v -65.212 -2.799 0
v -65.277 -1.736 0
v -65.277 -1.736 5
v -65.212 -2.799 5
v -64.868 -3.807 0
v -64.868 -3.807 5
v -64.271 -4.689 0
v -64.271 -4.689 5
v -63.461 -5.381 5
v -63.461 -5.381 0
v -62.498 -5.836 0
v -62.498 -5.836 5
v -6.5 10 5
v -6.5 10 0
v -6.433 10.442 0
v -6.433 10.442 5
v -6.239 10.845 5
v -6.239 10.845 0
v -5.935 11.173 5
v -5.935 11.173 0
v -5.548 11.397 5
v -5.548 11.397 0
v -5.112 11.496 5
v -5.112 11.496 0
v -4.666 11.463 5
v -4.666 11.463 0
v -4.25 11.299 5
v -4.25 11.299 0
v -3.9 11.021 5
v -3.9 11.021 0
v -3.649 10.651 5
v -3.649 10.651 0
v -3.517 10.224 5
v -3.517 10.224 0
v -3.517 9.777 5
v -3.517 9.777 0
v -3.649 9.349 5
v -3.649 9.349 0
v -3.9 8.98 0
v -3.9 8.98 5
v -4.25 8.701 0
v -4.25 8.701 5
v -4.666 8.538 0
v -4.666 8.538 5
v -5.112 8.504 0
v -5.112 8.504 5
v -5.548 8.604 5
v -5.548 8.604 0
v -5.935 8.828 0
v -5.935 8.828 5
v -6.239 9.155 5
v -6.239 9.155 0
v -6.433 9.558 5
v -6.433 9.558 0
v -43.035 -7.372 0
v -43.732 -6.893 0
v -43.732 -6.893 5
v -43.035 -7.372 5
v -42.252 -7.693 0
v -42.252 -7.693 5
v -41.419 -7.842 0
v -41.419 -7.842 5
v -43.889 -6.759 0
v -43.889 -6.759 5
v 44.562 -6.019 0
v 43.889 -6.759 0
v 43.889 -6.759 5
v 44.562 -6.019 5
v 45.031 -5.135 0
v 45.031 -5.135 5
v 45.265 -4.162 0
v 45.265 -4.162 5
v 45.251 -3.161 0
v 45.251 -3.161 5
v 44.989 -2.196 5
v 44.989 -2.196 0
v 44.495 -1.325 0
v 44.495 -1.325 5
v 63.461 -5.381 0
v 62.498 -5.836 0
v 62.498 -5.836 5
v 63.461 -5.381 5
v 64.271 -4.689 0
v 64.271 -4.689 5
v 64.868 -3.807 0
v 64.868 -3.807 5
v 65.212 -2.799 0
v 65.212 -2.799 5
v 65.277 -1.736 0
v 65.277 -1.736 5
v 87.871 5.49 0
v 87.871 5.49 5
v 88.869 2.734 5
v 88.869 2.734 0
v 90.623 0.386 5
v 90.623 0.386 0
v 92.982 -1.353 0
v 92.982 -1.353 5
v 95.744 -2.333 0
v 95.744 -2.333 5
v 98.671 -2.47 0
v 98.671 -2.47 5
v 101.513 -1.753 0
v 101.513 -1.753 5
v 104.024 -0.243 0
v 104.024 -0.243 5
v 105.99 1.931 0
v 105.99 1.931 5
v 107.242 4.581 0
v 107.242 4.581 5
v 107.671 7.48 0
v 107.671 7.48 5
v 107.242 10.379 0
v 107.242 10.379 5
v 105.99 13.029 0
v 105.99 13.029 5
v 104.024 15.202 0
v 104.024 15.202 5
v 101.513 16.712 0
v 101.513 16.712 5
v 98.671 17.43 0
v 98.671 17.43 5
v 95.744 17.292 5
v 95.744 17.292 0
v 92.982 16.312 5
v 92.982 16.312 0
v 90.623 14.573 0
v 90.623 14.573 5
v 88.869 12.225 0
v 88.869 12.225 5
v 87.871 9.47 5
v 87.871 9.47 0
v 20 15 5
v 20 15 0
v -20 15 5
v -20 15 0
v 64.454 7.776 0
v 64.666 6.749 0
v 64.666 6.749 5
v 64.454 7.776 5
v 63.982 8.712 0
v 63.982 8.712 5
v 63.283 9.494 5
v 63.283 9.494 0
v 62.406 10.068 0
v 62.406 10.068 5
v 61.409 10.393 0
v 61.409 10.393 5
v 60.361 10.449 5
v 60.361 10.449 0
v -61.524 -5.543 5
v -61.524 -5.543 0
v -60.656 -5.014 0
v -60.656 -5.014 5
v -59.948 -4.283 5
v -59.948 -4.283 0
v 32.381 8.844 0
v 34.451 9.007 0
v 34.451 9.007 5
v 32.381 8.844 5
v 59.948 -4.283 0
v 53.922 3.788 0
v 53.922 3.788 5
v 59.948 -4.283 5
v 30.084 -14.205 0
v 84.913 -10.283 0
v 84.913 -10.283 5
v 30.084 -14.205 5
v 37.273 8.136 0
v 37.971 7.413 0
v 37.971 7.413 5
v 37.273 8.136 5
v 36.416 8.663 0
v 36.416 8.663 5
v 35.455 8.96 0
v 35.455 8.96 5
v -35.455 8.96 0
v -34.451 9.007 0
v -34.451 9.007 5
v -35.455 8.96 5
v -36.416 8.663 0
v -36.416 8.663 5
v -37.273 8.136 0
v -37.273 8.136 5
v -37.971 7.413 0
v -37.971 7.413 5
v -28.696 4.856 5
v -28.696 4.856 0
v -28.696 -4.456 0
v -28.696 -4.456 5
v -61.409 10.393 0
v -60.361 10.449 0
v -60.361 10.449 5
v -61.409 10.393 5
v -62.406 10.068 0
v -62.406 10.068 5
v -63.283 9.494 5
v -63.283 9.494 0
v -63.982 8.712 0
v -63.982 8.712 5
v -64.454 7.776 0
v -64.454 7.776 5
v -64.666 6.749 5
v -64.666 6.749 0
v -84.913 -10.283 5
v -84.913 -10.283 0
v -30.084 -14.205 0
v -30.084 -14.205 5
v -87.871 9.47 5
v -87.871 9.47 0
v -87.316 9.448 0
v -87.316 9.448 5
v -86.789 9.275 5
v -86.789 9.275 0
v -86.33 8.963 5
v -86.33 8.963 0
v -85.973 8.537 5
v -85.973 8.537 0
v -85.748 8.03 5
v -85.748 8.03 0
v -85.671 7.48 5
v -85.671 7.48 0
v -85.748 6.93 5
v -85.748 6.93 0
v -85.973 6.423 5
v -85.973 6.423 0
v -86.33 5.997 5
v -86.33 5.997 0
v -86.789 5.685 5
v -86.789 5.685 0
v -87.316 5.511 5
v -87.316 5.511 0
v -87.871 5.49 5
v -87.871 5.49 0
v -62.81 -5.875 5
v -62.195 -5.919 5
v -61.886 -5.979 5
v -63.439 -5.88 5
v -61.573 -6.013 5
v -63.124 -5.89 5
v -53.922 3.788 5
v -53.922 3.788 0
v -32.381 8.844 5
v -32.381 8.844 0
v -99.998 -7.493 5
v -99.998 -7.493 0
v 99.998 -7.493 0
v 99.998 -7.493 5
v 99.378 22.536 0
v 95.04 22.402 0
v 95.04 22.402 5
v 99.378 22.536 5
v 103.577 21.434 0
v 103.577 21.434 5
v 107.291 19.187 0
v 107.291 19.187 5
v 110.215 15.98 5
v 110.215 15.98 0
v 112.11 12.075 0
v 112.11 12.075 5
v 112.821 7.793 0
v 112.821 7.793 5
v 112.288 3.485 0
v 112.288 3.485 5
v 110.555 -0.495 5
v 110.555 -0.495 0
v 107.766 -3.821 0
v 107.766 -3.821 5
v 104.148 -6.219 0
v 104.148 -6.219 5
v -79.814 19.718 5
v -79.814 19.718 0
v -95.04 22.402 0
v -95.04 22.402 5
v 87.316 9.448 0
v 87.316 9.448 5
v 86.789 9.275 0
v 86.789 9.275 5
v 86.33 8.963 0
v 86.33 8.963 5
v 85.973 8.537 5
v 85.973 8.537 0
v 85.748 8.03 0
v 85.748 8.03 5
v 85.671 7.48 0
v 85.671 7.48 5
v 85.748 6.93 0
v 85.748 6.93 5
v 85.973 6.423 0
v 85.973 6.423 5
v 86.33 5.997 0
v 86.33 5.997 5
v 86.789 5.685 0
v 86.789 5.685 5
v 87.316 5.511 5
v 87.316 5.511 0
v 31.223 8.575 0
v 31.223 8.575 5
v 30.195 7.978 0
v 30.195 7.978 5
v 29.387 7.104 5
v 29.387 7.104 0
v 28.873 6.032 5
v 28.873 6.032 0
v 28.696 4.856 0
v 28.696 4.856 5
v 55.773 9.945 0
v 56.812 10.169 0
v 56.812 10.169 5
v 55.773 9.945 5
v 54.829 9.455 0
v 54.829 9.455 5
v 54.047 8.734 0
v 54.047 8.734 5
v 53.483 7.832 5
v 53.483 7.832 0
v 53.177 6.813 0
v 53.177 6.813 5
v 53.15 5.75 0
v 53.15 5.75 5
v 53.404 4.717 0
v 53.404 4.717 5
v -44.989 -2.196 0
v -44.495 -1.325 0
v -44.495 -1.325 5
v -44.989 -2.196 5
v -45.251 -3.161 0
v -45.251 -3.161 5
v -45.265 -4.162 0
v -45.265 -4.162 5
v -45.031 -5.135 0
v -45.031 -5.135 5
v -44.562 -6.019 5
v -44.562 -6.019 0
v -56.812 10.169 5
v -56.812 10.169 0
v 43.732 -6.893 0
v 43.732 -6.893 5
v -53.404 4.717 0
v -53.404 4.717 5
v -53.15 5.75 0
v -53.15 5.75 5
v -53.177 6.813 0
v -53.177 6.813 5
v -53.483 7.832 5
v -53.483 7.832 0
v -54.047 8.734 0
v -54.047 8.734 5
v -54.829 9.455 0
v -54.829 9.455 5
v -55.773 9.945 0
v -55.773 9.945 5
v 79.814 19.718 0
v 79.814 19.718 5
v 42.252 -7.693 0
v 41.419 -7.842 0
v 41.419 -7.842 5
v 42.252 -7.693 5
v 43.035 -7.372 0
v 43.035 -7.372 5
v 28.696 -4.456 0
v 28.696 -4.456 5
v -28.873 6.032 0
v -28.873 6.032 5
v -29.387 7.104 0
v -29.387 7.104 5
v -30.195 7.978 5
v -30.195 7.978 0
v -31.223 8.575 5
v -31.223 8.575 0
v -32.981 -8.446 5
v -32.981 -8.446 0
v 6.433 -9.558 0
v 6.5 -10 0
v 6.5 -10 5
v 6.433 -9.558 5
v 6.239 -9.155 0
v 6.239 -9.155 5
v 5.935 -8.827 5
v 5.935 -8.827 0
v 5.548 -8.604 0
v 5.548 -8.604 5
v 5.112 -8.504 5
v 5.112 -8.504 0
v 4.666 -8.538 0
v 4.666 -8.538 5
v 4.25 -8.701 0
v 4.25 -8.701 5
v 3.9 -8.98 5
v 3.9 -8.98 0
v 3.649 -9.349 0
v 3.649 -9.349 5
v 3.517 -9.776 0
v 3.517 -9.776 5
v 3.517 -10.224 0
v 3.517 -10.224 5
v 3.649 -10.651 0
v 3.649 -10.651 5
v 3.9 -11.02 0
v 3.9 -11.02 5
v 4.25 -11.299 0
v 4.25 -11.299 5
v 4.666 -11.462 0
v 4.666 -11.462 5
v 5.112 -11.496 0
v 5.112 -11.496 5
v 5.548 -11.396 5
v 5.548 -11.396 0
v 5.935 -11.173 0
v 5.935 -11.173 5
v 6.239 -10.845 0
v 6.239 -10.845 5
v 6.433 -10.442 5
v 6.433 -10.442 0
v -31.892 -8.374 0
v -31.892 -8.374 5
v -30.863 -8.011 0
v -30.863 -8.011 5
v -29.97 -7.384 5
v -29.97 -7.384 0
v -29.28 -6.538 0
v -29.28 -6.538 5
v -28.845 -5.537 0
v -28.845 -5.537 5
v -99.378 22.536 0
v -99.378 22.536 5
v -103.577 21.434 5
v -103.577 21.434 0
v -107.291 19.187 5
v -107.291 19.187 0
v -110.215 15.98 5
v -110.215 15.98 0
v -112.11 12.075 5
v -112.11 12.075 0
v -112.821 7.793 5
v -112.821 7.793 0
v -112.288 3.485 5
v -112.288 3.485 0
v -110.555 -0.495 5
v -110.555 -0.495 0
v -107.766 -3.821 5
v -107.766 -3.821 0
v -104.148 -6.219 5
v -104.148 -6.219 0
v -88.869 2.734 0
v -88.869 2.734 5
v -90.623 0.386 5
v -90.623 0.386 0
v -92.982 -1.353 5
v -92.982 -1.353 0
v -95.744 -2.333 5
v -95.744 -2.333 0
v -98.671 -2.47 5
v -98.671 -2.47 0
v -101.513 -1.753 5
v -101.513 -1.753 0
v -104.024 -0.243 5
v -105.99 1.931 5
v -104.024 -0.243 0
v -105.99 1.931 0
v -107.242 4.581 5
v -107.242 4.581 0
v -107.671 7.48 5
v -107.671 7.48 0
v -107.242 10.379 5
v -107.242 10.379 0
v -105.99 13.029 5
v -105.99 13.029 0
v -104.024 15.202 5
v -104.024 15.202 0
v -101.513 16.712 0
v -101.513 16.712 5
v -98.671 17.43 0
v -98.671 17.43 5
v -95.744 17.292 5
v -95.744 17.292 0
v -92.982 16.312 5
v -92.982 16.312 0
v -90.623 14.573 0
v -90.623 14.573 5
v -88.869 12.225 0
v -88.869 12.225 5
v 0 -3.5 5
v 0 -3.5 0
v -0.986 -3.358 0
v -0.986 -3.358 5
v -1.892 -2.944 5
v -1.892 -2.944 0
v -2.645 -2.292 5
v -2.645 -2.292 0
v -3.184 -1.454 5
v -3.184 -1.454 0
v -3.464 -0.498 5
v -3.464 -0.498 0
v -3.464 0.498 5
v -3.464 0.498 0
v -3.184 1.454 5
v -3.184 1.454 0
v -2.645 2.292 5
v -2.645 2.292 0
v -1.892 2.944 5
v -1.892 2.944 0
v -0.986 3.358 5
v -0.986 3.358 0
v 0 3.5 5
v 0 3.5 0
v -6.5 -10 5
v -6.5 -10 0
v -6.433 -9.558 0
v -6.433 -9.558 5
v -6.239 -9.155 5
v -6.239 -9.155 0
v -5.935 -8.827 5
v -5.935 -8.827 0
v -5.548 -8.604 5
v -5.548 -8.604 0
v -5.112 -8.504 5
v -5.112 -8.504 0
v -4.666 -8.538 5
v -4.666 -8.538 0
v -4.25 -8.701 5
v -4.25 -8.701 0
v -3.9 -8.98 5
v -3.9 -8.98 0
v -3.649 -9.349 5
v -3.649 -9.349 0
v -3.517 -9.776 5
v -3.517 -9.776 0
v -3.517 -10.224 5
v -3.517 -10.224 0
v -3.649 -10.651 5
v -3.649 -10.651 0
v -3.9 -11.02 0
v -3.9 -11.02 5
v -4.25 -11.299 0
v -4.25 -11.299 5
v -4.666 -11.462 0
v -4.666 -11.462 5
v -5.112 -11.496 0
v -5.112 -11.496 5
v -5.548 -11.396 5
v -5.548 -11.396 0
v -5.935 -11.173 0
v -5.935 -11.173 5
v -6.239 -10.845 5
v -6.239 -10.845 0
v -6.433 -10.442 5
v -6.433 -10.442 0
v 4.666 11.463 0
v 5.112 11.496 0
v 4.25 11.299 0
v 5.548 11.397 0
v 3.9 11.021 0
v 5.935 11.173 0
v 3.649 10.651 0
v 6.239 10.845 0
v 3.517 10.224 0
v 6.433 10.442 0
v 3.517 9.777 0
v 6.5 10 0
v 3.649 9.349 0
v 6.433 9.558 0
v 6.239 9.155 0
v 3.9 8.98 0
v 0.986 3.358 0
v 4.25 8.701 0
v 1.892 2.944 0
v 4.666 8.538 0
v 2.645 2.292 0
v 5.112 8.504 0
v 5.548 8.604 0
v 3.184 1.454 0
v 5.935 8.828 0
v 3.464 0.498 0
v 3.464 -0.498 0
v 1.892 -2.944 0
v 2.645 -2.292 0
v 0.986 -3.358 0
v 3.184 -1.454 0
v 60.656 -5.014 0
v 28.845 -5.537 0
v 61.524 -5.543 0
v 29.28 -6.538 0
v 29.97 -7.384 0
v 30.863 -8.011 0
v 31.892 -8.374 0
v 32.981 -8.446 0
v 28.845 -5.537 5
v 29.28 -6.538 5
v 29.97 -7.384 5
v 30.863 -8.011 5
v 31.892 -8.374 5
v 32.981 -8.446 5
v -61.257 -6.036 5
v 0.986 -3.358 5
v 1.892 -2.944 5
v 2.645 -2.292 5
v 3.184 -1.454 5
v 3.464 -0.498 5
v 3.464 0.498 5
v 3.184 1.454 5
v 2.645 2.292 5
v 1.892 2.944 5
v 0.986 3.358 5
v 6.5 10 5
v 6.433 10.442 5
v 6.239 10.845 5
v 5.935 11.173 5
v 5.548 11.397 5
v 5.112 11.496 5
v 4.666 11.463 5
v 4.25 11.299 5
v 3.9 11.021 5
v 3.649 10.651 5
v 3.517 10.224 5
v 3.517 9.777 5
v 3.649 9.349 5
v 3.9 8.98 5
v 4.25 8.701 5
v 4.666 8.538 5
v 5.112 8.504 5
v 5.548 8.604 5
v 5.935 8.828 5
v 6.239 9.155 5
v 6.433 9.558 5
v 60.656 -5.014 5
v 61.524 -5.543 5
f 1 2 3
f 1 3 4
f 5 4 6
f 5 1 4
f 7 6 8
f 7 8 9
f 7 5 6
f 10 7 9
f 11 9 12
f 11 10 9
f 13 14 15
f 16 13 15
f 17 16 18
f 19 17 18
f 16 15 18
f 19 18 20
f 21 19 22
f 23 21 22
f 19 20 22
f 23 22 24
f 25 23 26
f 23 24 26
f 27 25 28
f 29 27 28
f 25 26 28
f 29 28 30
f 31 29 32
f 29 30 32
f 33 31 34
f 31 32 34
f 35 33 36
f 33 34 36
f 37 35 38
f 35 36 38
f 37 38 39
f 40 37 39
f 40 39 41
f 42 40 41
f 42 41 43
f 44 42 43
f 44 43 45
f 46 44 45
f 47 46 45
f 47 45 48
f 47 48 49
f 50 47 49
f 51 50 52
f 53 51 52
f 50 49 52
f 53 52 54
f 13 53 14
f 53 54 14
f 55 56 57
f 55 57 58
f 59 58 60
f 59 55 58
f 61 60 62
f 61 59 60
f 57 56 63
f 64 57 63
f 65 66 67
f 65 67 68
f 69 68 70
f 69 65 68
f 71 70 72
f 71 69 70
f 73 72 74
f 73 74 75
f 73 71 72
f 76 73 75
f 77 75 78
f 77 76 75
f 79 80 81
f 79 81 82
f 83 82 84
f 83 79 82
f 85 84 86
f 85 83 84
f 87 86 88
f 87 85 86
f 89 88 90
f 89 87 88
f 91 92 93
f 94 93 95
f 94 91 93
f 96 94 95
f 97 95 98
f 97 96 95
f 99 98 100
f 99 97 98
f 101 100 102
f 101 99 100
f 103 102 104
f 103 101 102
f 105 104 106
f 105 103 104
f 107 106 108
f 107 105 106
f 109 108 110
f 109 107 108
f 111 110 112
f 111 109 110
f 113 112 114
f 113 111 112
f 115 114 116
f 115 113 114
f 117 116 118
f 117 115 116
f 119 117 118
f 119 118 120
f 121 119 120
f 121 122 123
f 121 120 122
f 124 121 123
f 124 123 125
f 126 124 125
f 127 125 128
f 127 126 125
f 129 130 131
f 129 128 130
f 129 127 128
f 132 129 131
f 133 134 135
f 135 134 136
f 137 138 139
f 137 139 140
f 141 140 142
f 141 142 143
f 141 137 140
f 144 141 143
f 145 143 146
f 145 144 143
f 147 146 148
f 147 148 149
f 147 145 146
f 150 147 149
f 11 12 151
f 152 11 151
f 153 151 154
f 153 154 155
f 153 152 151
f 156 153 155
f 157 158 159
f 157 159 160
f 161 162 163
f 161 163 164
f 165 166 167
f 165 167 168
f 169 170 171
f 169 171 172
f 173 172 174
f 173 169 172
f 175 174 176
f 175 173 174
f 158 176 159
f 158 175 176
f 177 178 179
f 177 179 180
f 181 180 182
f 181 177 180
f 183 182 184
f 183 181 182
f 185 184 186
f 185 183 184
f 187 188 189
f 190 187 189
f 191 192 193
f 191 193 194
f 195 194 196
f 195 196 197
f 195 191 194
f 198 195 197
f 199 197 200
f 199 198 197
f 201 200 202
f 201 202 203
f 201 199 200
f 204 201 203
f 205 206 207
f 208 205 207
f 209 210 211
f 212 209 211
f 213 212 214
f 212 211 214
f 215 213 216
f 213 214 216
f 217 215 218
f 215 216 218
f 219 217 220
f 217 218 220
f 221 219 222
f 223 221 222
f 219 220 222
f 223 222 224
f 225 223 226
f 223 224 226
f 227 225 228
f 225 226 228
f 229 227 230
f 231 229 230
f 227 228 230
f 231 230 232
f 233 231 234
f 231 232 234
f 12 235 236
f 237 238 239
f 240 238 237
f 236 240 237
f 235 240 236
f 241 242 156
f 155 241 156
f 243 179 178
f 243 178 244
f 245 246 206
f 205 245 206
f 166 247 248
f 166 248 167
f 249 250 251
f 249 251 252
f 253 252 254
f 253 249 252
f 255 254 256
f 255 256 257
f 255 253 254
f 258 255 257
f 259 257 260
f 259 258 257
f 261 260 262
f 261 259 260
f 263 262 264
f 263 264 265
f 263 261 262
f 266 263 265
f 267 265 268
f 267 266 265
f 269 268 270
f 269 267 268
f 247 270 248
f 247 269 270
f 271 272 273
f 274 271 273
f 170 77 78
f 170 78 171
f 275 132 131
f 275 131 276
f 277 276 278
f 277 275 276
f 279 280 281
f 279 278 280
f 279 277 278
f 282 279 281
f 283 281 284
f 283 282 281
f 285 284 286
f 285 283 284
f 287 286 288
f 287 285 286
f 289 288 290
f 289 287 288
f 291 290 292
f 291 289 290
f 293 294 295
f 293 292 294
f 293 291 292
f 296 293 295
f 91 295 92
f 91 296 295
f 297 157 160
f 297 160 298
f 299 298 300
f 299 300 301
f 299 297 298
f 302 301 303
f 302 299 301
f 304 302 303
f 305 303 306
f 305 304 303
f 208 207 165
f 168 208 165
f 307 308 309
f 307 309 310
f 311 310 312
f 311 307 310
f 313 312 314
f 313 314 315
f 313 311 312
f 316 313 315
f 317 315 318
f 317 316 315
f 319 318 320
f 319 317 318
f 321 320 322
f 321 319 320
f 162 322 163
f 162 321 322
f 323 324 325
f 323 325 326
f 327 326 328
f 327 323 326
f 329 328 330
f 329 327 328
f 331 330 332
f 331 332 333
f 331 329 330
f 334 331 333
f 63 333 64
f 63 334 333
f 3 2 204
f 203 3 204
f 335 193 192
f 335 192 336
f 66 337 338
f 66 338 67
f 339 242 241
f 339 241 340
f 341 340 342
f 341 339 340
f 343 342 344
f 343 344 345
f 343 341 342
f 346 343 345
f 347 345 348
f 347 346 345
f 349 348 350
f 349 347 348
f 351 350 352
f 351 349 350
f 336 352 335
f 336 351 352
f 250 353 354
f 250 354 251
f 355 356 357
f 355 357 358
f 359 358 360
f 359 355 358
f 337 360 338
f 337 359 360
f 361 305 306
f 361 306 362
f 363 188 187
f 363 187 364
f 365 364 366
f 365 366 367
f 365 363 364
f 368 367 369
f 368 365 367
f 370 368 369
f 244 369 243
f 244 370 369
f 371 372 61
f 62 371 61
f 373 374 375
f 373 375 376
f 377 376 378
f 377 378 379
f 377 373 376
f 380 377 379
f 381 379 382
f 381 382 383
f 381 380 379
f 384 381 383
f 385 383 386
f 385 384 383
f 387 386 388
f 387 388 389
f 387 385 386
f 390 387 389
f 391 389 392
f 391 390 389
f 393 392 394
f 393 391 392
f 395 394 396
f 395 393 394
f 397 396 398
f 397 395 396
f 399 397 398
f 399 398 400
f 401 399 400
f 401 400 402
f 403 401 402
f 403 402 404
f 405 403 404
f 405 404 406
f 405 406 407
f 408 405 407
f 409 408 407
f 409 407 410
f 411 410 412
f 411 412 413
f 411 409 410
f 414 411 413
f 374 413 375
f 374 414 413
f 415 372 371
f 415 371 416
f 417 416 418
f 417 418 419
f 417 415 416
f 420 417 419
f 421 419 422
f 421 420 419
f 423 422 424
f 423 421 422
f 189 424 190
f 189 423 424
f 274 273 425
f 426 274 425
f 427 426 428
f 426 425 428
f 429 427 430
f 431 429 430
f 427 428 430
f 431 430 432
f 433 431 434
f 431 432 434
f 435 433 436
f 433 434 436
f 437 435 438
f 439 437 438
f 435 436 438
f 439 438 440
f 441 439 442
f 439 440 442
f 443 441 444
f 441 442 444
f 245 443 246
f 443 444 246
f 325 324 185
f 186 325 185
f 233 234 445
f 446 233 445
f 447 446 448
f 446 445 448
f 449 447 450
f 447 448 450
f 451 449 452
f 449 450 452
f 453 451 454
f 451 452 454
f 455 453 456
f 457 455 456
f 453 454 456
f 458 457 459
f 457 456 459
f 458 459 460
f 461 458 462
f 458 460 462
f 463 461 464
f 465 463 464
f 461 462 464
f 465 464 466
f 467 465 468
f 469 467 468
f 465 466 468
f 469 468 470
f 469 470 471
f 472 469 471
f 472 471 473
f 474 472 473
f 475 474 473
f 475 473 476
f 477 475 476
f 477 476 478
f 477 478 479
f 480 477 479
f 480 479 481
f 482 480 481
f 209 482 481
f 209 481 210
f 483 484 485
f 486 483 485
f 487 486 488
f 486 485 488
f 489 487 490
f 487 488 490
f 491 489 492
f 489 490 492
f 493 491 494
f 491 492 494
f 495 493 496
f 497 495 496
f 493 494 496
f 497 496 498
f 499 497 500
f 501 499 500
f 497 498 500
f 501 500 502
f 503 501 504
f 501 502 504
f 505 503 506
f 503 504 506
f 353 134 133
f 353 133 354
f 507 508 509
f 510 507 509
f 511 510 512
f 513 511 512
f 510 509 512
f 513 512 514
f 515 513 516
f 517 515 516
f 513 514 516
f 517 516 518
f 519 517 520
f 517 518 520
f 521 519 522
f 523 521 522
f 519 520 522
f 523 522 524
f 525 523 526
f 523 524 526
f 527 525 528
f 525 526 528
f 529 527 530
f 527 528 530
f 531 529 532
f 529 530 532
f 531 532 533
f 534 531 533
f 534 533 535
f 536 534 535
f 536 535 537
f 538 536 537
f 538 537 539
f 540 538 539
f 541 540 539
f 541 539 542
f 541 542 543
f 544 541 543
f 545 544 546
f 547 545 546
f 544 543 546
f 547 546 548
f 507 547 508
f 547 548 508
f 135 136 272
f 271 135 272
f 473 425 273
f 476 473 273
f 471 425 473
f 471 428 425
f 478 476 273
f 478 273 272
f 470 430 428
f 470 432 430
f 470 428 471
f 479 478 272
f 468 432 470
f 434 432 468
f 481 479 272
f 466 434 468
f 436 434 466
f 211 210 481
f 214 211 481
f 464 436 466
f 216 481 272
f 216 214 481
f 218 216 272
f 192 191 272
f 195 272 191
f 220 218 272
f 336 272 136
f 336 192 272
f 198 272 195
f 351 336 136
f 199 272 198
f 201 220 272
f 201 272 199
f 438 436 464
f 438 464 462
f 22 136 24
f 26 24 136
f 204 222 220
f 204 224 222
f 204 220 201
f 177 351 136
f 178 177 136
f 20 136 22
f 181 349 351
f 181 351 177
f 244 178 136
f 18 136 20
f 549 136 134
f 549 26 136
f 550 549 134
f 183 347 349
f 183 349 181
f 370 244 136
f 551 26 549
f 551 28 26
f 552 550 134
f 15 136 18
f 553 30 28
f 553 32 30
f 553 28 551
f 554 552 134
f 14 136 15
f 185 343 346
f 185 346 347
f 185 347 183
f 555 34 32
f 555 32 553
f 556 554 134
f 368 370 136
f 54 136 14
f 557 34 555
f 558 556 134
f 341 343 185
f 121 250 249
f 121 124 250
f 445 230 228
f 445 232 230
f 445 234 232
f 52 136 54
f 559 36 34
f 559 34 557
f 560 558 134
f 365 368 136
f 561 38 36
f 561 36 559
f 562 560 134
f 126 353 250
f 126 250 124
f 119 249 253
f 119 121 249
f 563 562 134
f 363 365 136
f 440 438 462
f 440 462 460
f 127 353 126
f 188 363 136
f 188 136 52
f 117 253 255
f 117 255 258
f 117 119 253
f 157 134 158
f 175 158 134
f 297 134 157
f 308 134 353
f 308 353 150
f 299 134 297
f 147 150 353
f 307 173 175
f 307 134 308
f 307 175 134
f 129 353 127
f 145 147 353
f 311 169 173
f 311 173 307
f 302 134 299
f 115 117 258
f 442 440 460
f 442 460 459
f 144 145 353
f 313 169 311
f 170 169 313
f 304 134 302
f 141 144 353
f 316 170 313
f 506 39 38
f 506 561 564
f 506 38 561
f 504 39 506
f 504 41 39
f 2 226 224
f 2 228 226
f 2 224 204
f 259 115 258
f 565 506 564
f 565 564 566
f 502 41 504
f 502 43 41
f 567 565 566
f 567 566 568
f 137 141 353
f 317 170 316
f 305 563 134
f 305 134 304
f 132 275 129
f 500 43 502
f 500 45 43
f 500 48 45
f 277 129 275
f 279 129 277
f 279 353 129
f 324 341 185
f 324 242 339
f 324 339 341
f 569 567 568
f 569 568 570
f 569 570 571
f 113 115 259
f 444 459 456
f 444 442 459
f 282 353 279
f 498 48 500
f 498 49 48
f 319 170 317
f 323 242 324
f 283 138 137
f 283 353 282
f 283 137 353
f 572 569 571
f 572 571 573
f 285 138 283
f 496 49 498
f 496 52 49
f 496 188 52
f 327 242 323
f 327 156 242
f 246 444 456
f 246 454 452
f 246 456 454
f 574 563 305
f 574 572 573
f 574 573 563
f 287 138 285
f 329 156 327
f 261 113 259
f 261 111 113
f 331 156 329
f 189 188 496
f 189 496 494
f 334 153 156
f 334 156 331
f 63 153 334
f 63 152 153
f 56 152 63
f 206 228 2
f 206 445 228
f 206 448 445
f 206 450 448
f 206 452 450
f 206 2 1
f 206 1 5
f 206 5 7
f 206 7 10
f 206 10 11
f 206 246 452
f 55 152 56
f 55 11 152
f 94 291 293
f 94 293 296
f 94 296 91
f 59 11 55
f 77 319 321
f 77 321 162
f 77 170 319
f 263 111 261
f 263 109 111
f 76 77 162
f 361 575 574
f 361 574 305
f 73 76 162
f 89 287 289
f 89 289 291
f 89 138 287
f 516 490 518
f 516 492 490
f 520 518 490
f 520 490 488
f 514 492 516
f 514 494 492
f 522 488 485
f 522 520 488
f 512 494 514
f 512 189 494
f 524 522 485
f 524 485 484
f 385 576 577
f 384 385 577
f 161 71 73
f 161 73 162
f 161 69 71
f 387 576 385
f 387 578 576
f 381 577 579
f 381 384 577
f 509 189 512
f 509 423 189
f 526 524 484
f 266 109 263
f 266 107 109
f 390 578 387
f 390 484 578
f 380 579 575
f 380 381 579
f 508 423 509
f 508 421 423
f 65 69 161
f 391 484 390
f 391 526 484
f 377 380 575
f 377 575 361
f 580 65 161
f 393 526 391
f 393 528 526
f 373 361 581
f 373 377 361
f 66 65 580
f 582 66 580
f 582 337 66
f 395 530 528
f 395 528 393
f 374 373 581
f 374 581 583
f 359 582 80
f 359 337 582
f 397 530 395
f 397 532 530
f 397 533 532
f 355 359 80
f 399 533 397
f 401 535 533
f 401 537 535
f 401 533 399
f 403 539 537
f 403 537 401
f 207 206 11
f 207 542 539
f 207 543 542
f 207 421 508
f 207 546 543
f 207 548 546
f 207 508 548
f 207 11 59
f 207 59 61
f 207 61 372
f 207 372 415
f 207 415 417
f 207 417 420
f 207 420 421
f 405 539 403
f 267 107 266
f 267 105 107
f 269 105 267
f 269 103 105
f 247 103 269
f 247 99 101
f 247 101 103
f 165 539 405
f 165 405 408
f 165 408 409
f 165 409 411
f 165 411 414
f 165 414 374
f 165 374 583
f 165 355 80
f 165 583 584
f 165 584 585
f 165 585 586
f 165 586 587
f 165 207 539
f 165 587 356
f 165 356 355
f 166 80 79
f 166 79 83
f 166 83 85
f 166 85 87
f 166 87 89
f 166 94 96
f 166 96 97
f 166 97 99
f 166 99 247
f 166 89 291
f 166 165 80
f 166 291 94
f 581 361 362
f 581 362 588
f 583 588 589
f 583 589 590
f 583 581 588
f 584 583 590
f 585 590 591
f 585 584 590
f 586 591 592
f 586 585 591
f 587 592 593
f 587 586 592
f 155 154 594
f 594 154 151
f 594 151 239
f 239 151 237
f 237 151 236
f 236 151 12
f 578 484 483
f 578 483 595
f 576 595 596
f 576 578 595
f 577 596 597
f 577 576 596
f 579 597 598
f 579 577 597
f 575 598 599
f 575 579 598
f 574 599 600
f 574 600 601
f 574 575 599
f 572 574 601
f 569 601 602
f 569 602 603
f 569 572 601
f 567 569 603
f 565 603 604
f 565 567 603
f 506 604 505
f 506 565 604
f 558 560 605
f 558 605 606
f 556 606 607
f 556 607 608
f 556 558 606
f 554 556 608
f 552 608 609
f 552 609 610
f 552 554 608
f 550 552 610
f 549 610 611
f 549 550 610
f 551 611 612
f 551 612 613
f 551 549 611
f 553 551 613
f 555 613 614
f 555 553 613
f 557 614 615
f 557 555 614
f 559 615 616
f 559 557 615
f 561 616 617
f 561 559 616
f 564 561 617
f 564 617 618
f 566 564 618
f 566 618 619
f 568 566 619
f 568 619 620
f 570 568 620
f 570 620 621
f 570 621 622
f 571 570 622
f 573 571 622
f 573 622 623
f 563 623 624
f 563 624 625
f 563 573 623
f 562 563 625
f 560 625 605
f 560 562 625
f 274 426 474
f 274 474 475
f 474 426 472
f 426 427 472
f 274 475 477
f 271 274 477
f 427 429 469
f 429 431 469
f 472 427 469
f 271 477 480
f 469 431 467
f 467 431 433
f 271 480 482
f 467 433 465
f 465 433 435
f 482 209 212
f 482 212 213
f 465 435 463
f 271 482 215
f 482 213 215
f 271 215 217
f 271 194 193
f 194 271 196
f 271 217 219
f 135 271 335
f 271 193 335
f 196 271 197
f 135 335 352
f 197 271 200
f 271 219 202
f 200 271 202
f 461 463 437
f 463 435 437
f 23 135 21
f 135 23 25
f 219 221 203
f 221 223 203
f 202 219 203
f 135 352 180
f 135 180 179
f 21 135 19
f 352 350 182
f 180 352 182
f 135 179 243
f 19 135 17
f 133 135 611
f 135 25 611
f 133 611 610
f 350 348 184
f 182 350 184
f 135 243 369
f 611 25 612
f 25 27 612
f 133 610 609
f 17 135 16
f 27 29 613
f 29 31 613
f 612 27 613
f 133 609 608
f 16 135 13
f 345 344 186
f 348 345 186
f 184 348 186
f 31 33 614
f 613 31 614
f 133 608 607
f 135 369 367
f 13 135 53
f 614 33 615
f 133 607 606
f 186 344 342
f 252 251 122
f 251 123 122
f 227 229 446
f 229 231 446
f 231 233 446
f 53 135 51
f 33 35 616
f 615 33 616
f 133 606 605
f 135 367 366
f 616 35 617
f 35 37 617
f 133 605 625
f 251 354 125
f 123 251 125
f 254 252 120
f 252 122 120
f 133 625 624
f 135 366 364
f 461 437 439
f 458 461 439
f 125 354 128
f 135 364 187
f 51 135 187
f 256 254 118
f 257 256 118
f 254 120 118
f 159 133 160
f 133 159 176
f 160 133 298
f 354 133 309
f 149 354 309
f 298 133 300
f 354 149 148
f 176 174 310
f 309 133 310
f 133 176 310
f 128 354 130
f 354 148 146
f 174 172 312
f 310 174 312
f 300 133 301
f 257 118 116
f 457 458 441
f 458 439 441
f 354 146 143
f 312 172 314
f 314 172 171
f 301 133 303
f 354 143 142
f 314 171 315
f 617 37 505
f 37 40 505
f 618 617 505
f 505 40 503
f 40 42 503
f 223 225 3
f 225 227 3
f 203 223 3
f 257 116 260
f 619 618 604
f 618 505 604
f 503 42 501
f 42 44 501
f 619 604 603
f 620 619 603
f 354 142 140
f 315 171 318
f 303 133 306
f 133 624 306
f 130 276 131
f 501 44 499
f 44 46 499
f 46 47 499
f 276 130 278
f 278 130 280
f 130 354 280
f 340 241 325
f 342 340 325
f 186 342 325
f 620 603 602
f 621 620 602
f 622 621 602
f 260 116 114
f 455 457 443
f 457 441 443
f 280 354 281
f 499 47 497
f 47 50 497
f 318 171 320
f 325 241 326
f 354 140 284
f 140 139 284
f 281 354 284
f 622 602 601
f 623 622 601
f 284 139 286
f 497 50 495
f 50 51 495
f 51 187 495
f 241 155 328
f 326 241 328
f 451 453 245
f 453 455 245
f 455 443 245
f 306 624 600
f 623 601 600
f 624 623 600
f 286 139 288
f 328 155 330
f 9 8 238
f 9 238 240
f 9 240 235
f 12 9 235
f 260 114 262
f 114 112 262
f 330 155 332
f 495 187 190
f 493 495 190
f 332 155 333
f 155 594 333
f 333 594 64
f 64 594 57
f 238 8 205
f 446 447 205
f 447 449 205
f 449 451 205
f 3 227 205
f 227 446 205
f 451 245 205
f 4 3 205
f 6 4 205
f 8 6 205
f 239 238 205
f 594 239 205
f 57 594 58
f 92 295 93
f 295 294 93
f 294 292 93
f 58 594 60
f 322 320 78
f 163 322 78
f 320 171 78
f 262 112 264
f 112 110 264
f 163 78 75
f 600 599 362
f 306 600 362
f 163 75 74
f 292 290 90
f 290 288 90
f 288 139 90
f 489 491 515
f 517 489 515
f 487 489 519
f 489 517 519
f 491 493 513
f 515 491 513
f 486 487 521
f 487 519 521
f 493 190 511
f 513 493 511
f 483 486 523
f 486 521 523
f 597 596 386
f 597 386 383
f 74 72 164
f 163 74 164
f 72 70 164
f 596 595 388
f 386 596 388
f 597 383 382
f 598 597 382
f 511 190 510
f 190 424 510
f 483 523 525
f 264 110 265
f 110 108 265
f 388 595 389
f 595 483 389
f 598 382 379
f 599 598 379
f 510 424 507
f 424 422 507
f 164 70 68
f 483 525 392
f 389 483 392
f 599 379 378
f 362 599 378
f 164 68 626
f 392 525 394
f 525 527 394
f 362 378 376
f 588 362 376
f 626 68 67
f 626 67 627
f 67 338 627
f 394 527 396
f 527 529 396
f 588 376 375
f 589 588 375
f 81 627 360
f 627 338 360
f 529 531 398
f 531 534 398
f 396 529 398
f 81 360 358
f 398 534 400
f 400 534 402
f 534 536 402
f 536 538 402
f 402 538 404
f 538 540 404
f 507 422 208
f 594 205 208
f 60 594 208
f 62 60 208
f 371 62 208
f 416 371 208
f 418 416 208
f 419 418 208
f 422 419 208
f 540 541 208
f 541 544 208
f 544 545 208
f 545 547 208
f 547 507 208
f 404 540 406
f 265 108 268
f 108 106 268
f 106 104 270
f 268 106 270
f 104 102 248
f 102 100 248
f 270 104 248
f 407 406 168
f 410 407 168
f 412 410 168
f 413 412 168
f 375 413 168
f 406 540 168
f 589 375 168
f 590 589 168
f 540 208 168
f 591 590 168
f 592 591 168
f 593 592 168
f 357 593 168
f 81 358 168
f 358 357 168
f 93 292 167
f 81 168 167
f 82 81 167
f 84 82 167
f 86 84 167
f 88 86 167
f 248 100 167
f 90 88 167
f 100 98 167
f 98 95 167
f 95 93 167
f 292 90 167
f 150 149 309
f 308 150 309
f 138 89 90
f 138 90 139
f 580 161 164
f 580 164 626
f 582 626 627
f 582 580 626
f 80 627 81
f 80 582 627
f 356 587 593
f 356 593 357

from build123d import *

# Parameters (mm, degrees)
IZIM1_R                     = 1.5
Y_KSEKLIK_EKSTR_ZYON3_DEPTH = 5
KES_EKSTR_ZYON3_DEPTH       = 16
RADYUS1_R                   = 4
RADYUS1_OF_AYNALAMA1_R      = 4


with BuildPart() as part:
    # Çizim1 → Yükseklik-Ekstrüzyon3 (new body)
    with BuildSketch(Plane.XY):
        with BuildLine():
            Line((0, 15.000289945), (20, 15.000289945))
            Line((20, 15.000289945), (79.814271892, 19.717585574))
            Line((79.814271892, 19.717585574), (95.039910294, 22.402276423))
            ThreePointArc((95.039910294, 22.402276423), (112.619627342, 9.95914701), (99.998384592, -7.493135147))
            Line((99.998384592, -7.493135147), (84.9128284, -10.282704371))
            Line((84.9128284, -10.282704371), (30.084066985, -14.204712795))
            Line((30.084066985, -14.204712795), (0, -14.204712795))
            Line((0, -14.204712795), (0, -3.5))
            ThreePointArc((0, -3.5), (3.5, 0), (0, 3.5))
            Line((0, 3.5), (0, 15.000289945))
        make_face()
        with Locations((5, 10.000289945)):
            Circle(IZIM1_R, mode=Mode.SUBTRACT)
        with Locations((5, -10)):
            Circle(IZIM1_R, mode=Mode.SUBTRACT)
    y_kseklik_ekstr_zyon3 = extrude(amount=Y_KSEKLIK_EKSTR_ZYON3_DEPTH)

    # Çizim2 → Kes-Ekstrüzyon3 (cut)
    with BuildSketch(Plane.XY):
        with BuildLine():
            ThreePointArc((87.871148736, 5.489806807), (107.671148736, 7.479781681), (87.871148736, 9.469756555))
            ThreePointArc((87.871148736, 9.469756555), (85.671148736, 7.479781681), (87.871148736, 5.489806807))
        make_face()
        Polygon((65.565337221, -5.727765324), (64.37597588, 10.765231948), (49.583112015, 9.598582086), (61.257040732, -6.035946189), align=None)
        Polygon((42.731699056, -7.748306299), (46.735341753, -4.32569838), (36.65049886, 9.180616861), (28.695940883, 8.553274918), (28.695940883, -8.752311503), align=None)
    kes_ekstr_zyon3 = extrude(amount=KES_EKSTR_ZYON3_DEPTH, mode=Mode.SUBTRACT)

    # Radyus1
    # the kernel refuses this fillet: 4 mm, written as the material it adds along each edge
    with BuildSketch(Plane(origin=(28.695940883, -8.752311503, 0), x_dir=(0.9974513663147316, 0.07134964496670468, 0), z_dir=(0, 0, 1))) as radyus1_piece_1:
        with BuildLine():
            CenterArc((RADYUS1_R * 1.07408709953, RADYUS1_R), RADYUS1_R, 175.908489963, 94.091510037)
            Line((RADYUS1_R * 0.0766357332147, RADYUS1_R * 1.07134964497), (0, 0))
            Line((0, 0), (RADYUS1_R * 1.07408709953, 0))
        make_face()
    extrude(amount=5)
    with BuildSketch(Plane(origin=(64.37597588, 10.765231948, 0), x_dir=(-0.9969045315308735, -0.0786215938099059, 0), z_dir=(0, 0, 1))) as radyus1_piece_2:
        with BuildLine():
            CenterArc((RADYUS1_R * 1.0067369642, RADYUS1_R), RADYUS1_R, 179.615297698, 90.384702302)
            Line((RADYUS1_R * 0.00675950517271, RADYUS1_R * 1.00671427137), (0, 0))
            Line((0, 0), (RADYUS1_R * 1.0067369642, 0))
        make_face()
    extrude(amount=5)
    with BuildSketch(Plane(origin=(49.583112015, 9.598582086, 0), x_dir=(0.5982940894650635, -0.8012765955094225, 0), z_dir=(0, 0, 1))) as radyus1_piece_3:
        with BuildLine():
            CenterArc((RADYUS1_R * 1.81293545135, RADYUS1_R), RADYUS1_R, 147.761521051, 122.238478949)
            Line((RADYUS1_R * 0.967100347397, RADYUS1_R * 1.53344444595), (0, 0))
            Line((0, 0), (RADYUS1_R * 1.81293545135, 0))
        make_face()
    extrude(amount=5)
    with BuildSketch(Plane(origin=(65.565337221, -5.727765324, 0), x_dir=(-0.9974513663147317, -0.07134964496670451, 0), z_dir=(0, 0, 1))) as radyus1_piece_4:
        with BuildLine():
            CenterArc((RADYUS1_R * 1.0005783418, -RADYUS1_R), RADYUS1_R, 90, 90.033126964)
            Line((RADYUS1_R * 0.000578508947597, -RADYUS1_R * 1.00057817457), (0, 0))
            Line((0, 0), (RADYUS1_R * 1.0005783418, 0))
        make_face()
    extrude(amount=5)
    with BuildSketch(Plane(origin=(46.735341753, -4.32569838, 0), x_dir=(-0.5982940894650634, 0.8012765955094225, 0), z_dir=(0, 0, 1))) as radyus1_piece_5:
        with BuildLine():
            CenterArc((RADYUS1_R * 0.936136482984, RADYUS1_R), RADYUS1_R, 183.778435906, 86.221564094)
            Line((-RADYUS1_R * 0.0616898577771, RADYUS1_R * 0.934101641269), (0, 0))
            Line((0, 0), (RADYUS1_R * 0.936136482984, 0))
        make_face()
    extrude(amount=5)
    with BuildSketch(Plane(origin=(36.65049886, 9.180616861, 0), x_dir=(-0.9969045315308735, -0.07862159380990552, 0), z_dir=(0, 0, 1))) as radyus1_piece_6:
        with BuildLine():
            CenterArc((RADYUS1_R * 0.551591618585, RADYUS1_R), RADYUS1_R, 212.238478949, 57.761521051)
            Line((-RADYUS1_R * 0.294243485369, RADYUS1_R * 0.466555554046), (0, 0))
            Line((0, 0), (RADYUS1_R * 0.551591618585, 0))
        make_face()
    extrude(amount=5)
    with BuildSketch(Plane(origin=(28.695940883, 8.553274918, 0), x_dir=(0, -1, 0), z_dir=(0, 0, 1))) as radyus1_piece_7:
        with BuildLine():
            CenterArc((RADYUS1_R * 0.924239359987, RADYUS1_R), RADYUS1_R, 184.509339304, 85.490660696)
            Line((-RADYUS1_R * 0.072665171544, RADYUS1_R * 0.92137840619), (0, 0))
            Line((0, 0), (RADYUS1_R * 0.924239359987, 0))
        make_face()
    extrude(amount=5)
    with BuildSketch(Plane(origin=(42.731699056, -7.748306299, 0), x_dir=(-0.9974513663147319, -0.07134964496670451, 0), z_dir=(0, 0, 1))) as radyus1_piece_8:
        with BuildLine():
            CenterArc((RADYUS1_R * 0.32911927964, -RADYUS1_R), RADYUS1_R, 90, 36.434744123)
            Line((-RADYUS1_R * 0.26478758489, -RADYUS1_R * 0.195466199427), (0, 0))
            Line((0, 0), (RADYUS1_R * 0.32911927964, 0))
        make_face()
    extrude(amount=5)
    with BuildSketch(Plane(origin=(61.257040732, -6.035946189, 0), x_dir=(0.9974513663147319, 0.07134964496670383, 0), z_dir=(0, 0, 1))) as radyus1_piece_9:
        with BuildLine():
            CenterArc((RADYUS1_R * 0.546845511805, RADYUS1_R), RADYUS1_R, 212.656308216, 57.343691784)
            Line((-RADYUS1_R * 0.295076994051, RADYUS1_R * 0.460401543615), (0, 0))
            Line((0, 0), (RADYUS1_R * 0.546845511805, 0))
        make_face()
    extrude(amount=5)

    # Aynalama1: Yükseklik-Ekstrüzyon3, Kes-Ekstrüzyon3 across plane
    add(y_kseklik_ekstr_zyon3.mirror(Plane(origin=(0, 0, 0), x_dir=(0, 0, 1), z_dir=(1, 0, 0))))
    add(kes_ekstr_zyon3.mirror(Plane(origin=(0, 0, 0), x_dir=(0, 0, 1), z_dir=(1, 0, 0))), mode=Mode.SUBTRACT)

    # Radyus1 of Aynalama1
    # the kernel refuses this fillet: 4 mm, written as the material it adds along each edge
    with BuildSketch(Plane(origin=(-28.695940883, -8.752311503, 0), x_dir=(0, 1, 0), z_dir=(0, 0, 1))) as radyus1_of_aynalama1_piece_1:
        with BuildLine():
            CenterArc((RADYUS1_OF_AYNALAMA1_R * 1.07408709953, RADYUS1_OF_AYNALAMA1_R), RADYUS1_OF_AYNALAMA1_R, 175.908489963, 94.091510037)
            Line((RADYUS1_OF_AYNALAMA1_R * 0.0766357332147, RADYUS1_OF_AYNALAMA1_R * 1.07134964497), (0, 0))
            Line((0, 0), (RADYUS1_OF_AYNALAMA1_R * 1.07408709953, 0))
        make_face()
    extrude(amount=5)
    with BuildSketch(Plane(origin=(-64.37597588, 10.765231948, 0), x_dir=(-0.0719263340510189, -0.9974099470478431, 0), z_dir=(0, 0, 1))) as radyus1_of_aynalama1_piece_2:
        with BuildLine():
            CenterArc((RADYUS1_OF_AYNALAMA1_R * 1.0067369642, RADYUS1_OF_AYNALAMA1_R), RADYUS1_OF_AYNALAMA1_R, 179.615297698, 90.384702302)
            Line((RADYUS1_OF_AYNALAMA1_R * 0.00675950517271, RADYUS1_OF_AYNALAMA1_R * 1.00671427137), (0, 0))
            Line((0, 0), (RADYUS1_OF_AYNALAMA1_R * 1.0067369642, 0))
        make_face()
    extrude(amount=5)
    with BuildSketch(Plane(origin=(-49.583112015, 9.598582086, 0), x_dir=(-0.9969045315308733, 0.07862159380990602, 0), z_dir=(0, 0, 1))) as radyus1_of_aynalama1_piece_3:
        with BuildLine():
            CenterArc((RADYUS1_OF_AYNALAMA1_R * 1.81293545135, RADYUS1_OF_AYNALAMA1_R), RADYUS1_OF_AYNALAMA1_R, 147.761521051, 122.238478949)
            Line((RADYUS1_OF_AYNALAMA1_R * 0.967100347397, RADYUS1_OF_AYNALAMA1_R * 1.53344444595), (0, 0))
            Line((0, 0), (RADYUS1_OF_AYNALAMA1_R * 1.81293545135, 0))
        make_face()
    extrude(amount=5)
    with BuildSketch(Plane(origin=(-65.565337221, -5.727765324, 0), x_dir=(0.07192633405101899, 0.9974099470478431, 0), z_dir=(0, 0, 1))) as radyus1_of_aynalama1_piece_4:
        with BuildLine():
            CenterArc((RADYUS1_OF_AYNALAMA1_R * 1.0005783418, -RADYUS1_OF_AYNALAMA1_R), RADYUS1_OF_AYNALAMA1_R, 90, 90.033126964)
            Line((RADYUS1_OF_AYNALAMA1_R * 0.000578508947597, -RADYUS1_OF_AYNALAMA1_R * 1.00057817457), (0, 0))
            Line((0, 0), (RADYUS1_OF_AYNALAMA1_R * 1.0005783418, 0))
        make_face()
    extrude(amount=5)
    with BuildSketch(Plane(origin=(-46.735341753, -4.32569838, 0), x_dir=(0.7601082947002413, -0.6497964145237269, 0), z_dir=(0, 0, 1))) as radyus1_of_aynalama1_piece_5:
        with BuildLine():
            CenterArc((RADYUS1_OF_AYNALAMA1_R * 0.936136482984, RADYUS1_OF_AYNALAMA1_R), RADYUS1_OF_AYNALAMA1_R, 183.778435906, 86.221564094)
            Line((-RADYUS1_OF_AYNALAMA1_R * 0.0616898577771, RADYUS1_OF_AYNALAMA1_R * 0.934101641269), (0, 0))
            Line((0, 0), (RADYUS1_OF_AYNALAMA1_R * 0.936136482984, 0))
        make_face()
    extrude(amount=5)
    with BuildSketch(Plane(origin=(-36.65049886, 9.180616861, 0), x_dir=(-0.5982940894650631, -0.8012765955094229, 0), z_dir=(0, 0, 1))) as radyus1_of_aynalama1_piece_6:
        with BuildLine():
            CenterArc((RADYUS1_OF_AYNALAMA1_R * 0.551591618585, RADYUS1_OF_AYNALAMA1_R), RADYUS1_OF_AYNALAMA1_R, 212.238478949, 57.761521051)
            Line((-RADYUS1_OF_AYNALAMA1_R * 0.294243485369, RADYUS1_OF_AYNALAMA1_R * 0.466555554046), (0, 0))
            Line((0, 0), (RADYUS1_OF_AYNALAMA1_R * 0.551591618585, 0))
        make_face()
    extrude(amount=5)
    with BuildSketch(Plane(origin=(-28.695940883, 8.553274918, 0), x_dir=(-0.9969045315308733, 0.07862159380990584, 0), z_dir=(0, 0, 1))) as radyus1_of_aynalama1_piece_7:
        with BuildLine():
            CenterArc((RADYUS1_OF_AYNALAMA1_R * 0.924239359987, RADYUS1_OF_AYNALAMA1_R), RADYUS1_OF_AYNALAMA1_R, 184.509339304, 85.490660696)
            Line((-RADYUS1_OF_AYNALAMA1_R * 0.072665171544, RADYUS1_OF_AYNALAMA1_R * 0.92137840619), (0, 0))
            Line((0, 0), (RADYUS1_OF_AYNALAMA1_R * 0.924239359987, 0))
        make_face()
    extrude(amount=5)
    with BuildSketch(Plane(origin=(-42.731699056, -7.748306299, 0), x_dir=(-0.7601082947002398, 0.6497964145237288, 0), z_dir=(0, 0, 1))) as radyus1_of_aynalama1_piece_8:
        with BuildLine():
            CenterArc((RADYUS1_OF_AYNALAMA1_R * 0.32911927964, -RADYUS1_OF_AYNALAMA1_R), RADYUS1_OF_AYNALAMA1_R, 90, 36.434744123)
            Line((-RADYUS1_OF_AYNALAMA1_R * 0.26478758489, -RADYUS1_OF_AYNALAMA1_R * 0.195466199427), (0, 0))
            Line((0, 0), (RADYUS1_OF_AYNALAMA1_R * 0.32911927964, 0))
        make_face()
    extrude(amount=5)
    with BuildSketch(Plane(origin=(-61.257040732, -6.035946189, 0), x_dir=(0.5982940894650624, 0.8012765955094232, 0), z_dir=(0, 0, 1))) as radyus1_of_aynalama1_piece_9:
        with BuildLine():
            CenterArc((RADYUS1_OF_AYNALAMA1_R * 0.546845511805, RADYUS1_OF_AYNALAMA1_R), RADYUS1_OF_AYNALAMA1_R, 212.656308216, 57.343691784)
            Line((-RADYUS1_OF_AYNALAMA1_R * 0.295076994051, RADYUS1_OF_AYNALAMA1_R * 0.460401543615), (0, 0))
            Line((0, 0), (RADYUS1_OF_AYNALAMA1_R * 0.546845511805, 0))
        make_face()
    extrude(amount=5)


solid = part.part
